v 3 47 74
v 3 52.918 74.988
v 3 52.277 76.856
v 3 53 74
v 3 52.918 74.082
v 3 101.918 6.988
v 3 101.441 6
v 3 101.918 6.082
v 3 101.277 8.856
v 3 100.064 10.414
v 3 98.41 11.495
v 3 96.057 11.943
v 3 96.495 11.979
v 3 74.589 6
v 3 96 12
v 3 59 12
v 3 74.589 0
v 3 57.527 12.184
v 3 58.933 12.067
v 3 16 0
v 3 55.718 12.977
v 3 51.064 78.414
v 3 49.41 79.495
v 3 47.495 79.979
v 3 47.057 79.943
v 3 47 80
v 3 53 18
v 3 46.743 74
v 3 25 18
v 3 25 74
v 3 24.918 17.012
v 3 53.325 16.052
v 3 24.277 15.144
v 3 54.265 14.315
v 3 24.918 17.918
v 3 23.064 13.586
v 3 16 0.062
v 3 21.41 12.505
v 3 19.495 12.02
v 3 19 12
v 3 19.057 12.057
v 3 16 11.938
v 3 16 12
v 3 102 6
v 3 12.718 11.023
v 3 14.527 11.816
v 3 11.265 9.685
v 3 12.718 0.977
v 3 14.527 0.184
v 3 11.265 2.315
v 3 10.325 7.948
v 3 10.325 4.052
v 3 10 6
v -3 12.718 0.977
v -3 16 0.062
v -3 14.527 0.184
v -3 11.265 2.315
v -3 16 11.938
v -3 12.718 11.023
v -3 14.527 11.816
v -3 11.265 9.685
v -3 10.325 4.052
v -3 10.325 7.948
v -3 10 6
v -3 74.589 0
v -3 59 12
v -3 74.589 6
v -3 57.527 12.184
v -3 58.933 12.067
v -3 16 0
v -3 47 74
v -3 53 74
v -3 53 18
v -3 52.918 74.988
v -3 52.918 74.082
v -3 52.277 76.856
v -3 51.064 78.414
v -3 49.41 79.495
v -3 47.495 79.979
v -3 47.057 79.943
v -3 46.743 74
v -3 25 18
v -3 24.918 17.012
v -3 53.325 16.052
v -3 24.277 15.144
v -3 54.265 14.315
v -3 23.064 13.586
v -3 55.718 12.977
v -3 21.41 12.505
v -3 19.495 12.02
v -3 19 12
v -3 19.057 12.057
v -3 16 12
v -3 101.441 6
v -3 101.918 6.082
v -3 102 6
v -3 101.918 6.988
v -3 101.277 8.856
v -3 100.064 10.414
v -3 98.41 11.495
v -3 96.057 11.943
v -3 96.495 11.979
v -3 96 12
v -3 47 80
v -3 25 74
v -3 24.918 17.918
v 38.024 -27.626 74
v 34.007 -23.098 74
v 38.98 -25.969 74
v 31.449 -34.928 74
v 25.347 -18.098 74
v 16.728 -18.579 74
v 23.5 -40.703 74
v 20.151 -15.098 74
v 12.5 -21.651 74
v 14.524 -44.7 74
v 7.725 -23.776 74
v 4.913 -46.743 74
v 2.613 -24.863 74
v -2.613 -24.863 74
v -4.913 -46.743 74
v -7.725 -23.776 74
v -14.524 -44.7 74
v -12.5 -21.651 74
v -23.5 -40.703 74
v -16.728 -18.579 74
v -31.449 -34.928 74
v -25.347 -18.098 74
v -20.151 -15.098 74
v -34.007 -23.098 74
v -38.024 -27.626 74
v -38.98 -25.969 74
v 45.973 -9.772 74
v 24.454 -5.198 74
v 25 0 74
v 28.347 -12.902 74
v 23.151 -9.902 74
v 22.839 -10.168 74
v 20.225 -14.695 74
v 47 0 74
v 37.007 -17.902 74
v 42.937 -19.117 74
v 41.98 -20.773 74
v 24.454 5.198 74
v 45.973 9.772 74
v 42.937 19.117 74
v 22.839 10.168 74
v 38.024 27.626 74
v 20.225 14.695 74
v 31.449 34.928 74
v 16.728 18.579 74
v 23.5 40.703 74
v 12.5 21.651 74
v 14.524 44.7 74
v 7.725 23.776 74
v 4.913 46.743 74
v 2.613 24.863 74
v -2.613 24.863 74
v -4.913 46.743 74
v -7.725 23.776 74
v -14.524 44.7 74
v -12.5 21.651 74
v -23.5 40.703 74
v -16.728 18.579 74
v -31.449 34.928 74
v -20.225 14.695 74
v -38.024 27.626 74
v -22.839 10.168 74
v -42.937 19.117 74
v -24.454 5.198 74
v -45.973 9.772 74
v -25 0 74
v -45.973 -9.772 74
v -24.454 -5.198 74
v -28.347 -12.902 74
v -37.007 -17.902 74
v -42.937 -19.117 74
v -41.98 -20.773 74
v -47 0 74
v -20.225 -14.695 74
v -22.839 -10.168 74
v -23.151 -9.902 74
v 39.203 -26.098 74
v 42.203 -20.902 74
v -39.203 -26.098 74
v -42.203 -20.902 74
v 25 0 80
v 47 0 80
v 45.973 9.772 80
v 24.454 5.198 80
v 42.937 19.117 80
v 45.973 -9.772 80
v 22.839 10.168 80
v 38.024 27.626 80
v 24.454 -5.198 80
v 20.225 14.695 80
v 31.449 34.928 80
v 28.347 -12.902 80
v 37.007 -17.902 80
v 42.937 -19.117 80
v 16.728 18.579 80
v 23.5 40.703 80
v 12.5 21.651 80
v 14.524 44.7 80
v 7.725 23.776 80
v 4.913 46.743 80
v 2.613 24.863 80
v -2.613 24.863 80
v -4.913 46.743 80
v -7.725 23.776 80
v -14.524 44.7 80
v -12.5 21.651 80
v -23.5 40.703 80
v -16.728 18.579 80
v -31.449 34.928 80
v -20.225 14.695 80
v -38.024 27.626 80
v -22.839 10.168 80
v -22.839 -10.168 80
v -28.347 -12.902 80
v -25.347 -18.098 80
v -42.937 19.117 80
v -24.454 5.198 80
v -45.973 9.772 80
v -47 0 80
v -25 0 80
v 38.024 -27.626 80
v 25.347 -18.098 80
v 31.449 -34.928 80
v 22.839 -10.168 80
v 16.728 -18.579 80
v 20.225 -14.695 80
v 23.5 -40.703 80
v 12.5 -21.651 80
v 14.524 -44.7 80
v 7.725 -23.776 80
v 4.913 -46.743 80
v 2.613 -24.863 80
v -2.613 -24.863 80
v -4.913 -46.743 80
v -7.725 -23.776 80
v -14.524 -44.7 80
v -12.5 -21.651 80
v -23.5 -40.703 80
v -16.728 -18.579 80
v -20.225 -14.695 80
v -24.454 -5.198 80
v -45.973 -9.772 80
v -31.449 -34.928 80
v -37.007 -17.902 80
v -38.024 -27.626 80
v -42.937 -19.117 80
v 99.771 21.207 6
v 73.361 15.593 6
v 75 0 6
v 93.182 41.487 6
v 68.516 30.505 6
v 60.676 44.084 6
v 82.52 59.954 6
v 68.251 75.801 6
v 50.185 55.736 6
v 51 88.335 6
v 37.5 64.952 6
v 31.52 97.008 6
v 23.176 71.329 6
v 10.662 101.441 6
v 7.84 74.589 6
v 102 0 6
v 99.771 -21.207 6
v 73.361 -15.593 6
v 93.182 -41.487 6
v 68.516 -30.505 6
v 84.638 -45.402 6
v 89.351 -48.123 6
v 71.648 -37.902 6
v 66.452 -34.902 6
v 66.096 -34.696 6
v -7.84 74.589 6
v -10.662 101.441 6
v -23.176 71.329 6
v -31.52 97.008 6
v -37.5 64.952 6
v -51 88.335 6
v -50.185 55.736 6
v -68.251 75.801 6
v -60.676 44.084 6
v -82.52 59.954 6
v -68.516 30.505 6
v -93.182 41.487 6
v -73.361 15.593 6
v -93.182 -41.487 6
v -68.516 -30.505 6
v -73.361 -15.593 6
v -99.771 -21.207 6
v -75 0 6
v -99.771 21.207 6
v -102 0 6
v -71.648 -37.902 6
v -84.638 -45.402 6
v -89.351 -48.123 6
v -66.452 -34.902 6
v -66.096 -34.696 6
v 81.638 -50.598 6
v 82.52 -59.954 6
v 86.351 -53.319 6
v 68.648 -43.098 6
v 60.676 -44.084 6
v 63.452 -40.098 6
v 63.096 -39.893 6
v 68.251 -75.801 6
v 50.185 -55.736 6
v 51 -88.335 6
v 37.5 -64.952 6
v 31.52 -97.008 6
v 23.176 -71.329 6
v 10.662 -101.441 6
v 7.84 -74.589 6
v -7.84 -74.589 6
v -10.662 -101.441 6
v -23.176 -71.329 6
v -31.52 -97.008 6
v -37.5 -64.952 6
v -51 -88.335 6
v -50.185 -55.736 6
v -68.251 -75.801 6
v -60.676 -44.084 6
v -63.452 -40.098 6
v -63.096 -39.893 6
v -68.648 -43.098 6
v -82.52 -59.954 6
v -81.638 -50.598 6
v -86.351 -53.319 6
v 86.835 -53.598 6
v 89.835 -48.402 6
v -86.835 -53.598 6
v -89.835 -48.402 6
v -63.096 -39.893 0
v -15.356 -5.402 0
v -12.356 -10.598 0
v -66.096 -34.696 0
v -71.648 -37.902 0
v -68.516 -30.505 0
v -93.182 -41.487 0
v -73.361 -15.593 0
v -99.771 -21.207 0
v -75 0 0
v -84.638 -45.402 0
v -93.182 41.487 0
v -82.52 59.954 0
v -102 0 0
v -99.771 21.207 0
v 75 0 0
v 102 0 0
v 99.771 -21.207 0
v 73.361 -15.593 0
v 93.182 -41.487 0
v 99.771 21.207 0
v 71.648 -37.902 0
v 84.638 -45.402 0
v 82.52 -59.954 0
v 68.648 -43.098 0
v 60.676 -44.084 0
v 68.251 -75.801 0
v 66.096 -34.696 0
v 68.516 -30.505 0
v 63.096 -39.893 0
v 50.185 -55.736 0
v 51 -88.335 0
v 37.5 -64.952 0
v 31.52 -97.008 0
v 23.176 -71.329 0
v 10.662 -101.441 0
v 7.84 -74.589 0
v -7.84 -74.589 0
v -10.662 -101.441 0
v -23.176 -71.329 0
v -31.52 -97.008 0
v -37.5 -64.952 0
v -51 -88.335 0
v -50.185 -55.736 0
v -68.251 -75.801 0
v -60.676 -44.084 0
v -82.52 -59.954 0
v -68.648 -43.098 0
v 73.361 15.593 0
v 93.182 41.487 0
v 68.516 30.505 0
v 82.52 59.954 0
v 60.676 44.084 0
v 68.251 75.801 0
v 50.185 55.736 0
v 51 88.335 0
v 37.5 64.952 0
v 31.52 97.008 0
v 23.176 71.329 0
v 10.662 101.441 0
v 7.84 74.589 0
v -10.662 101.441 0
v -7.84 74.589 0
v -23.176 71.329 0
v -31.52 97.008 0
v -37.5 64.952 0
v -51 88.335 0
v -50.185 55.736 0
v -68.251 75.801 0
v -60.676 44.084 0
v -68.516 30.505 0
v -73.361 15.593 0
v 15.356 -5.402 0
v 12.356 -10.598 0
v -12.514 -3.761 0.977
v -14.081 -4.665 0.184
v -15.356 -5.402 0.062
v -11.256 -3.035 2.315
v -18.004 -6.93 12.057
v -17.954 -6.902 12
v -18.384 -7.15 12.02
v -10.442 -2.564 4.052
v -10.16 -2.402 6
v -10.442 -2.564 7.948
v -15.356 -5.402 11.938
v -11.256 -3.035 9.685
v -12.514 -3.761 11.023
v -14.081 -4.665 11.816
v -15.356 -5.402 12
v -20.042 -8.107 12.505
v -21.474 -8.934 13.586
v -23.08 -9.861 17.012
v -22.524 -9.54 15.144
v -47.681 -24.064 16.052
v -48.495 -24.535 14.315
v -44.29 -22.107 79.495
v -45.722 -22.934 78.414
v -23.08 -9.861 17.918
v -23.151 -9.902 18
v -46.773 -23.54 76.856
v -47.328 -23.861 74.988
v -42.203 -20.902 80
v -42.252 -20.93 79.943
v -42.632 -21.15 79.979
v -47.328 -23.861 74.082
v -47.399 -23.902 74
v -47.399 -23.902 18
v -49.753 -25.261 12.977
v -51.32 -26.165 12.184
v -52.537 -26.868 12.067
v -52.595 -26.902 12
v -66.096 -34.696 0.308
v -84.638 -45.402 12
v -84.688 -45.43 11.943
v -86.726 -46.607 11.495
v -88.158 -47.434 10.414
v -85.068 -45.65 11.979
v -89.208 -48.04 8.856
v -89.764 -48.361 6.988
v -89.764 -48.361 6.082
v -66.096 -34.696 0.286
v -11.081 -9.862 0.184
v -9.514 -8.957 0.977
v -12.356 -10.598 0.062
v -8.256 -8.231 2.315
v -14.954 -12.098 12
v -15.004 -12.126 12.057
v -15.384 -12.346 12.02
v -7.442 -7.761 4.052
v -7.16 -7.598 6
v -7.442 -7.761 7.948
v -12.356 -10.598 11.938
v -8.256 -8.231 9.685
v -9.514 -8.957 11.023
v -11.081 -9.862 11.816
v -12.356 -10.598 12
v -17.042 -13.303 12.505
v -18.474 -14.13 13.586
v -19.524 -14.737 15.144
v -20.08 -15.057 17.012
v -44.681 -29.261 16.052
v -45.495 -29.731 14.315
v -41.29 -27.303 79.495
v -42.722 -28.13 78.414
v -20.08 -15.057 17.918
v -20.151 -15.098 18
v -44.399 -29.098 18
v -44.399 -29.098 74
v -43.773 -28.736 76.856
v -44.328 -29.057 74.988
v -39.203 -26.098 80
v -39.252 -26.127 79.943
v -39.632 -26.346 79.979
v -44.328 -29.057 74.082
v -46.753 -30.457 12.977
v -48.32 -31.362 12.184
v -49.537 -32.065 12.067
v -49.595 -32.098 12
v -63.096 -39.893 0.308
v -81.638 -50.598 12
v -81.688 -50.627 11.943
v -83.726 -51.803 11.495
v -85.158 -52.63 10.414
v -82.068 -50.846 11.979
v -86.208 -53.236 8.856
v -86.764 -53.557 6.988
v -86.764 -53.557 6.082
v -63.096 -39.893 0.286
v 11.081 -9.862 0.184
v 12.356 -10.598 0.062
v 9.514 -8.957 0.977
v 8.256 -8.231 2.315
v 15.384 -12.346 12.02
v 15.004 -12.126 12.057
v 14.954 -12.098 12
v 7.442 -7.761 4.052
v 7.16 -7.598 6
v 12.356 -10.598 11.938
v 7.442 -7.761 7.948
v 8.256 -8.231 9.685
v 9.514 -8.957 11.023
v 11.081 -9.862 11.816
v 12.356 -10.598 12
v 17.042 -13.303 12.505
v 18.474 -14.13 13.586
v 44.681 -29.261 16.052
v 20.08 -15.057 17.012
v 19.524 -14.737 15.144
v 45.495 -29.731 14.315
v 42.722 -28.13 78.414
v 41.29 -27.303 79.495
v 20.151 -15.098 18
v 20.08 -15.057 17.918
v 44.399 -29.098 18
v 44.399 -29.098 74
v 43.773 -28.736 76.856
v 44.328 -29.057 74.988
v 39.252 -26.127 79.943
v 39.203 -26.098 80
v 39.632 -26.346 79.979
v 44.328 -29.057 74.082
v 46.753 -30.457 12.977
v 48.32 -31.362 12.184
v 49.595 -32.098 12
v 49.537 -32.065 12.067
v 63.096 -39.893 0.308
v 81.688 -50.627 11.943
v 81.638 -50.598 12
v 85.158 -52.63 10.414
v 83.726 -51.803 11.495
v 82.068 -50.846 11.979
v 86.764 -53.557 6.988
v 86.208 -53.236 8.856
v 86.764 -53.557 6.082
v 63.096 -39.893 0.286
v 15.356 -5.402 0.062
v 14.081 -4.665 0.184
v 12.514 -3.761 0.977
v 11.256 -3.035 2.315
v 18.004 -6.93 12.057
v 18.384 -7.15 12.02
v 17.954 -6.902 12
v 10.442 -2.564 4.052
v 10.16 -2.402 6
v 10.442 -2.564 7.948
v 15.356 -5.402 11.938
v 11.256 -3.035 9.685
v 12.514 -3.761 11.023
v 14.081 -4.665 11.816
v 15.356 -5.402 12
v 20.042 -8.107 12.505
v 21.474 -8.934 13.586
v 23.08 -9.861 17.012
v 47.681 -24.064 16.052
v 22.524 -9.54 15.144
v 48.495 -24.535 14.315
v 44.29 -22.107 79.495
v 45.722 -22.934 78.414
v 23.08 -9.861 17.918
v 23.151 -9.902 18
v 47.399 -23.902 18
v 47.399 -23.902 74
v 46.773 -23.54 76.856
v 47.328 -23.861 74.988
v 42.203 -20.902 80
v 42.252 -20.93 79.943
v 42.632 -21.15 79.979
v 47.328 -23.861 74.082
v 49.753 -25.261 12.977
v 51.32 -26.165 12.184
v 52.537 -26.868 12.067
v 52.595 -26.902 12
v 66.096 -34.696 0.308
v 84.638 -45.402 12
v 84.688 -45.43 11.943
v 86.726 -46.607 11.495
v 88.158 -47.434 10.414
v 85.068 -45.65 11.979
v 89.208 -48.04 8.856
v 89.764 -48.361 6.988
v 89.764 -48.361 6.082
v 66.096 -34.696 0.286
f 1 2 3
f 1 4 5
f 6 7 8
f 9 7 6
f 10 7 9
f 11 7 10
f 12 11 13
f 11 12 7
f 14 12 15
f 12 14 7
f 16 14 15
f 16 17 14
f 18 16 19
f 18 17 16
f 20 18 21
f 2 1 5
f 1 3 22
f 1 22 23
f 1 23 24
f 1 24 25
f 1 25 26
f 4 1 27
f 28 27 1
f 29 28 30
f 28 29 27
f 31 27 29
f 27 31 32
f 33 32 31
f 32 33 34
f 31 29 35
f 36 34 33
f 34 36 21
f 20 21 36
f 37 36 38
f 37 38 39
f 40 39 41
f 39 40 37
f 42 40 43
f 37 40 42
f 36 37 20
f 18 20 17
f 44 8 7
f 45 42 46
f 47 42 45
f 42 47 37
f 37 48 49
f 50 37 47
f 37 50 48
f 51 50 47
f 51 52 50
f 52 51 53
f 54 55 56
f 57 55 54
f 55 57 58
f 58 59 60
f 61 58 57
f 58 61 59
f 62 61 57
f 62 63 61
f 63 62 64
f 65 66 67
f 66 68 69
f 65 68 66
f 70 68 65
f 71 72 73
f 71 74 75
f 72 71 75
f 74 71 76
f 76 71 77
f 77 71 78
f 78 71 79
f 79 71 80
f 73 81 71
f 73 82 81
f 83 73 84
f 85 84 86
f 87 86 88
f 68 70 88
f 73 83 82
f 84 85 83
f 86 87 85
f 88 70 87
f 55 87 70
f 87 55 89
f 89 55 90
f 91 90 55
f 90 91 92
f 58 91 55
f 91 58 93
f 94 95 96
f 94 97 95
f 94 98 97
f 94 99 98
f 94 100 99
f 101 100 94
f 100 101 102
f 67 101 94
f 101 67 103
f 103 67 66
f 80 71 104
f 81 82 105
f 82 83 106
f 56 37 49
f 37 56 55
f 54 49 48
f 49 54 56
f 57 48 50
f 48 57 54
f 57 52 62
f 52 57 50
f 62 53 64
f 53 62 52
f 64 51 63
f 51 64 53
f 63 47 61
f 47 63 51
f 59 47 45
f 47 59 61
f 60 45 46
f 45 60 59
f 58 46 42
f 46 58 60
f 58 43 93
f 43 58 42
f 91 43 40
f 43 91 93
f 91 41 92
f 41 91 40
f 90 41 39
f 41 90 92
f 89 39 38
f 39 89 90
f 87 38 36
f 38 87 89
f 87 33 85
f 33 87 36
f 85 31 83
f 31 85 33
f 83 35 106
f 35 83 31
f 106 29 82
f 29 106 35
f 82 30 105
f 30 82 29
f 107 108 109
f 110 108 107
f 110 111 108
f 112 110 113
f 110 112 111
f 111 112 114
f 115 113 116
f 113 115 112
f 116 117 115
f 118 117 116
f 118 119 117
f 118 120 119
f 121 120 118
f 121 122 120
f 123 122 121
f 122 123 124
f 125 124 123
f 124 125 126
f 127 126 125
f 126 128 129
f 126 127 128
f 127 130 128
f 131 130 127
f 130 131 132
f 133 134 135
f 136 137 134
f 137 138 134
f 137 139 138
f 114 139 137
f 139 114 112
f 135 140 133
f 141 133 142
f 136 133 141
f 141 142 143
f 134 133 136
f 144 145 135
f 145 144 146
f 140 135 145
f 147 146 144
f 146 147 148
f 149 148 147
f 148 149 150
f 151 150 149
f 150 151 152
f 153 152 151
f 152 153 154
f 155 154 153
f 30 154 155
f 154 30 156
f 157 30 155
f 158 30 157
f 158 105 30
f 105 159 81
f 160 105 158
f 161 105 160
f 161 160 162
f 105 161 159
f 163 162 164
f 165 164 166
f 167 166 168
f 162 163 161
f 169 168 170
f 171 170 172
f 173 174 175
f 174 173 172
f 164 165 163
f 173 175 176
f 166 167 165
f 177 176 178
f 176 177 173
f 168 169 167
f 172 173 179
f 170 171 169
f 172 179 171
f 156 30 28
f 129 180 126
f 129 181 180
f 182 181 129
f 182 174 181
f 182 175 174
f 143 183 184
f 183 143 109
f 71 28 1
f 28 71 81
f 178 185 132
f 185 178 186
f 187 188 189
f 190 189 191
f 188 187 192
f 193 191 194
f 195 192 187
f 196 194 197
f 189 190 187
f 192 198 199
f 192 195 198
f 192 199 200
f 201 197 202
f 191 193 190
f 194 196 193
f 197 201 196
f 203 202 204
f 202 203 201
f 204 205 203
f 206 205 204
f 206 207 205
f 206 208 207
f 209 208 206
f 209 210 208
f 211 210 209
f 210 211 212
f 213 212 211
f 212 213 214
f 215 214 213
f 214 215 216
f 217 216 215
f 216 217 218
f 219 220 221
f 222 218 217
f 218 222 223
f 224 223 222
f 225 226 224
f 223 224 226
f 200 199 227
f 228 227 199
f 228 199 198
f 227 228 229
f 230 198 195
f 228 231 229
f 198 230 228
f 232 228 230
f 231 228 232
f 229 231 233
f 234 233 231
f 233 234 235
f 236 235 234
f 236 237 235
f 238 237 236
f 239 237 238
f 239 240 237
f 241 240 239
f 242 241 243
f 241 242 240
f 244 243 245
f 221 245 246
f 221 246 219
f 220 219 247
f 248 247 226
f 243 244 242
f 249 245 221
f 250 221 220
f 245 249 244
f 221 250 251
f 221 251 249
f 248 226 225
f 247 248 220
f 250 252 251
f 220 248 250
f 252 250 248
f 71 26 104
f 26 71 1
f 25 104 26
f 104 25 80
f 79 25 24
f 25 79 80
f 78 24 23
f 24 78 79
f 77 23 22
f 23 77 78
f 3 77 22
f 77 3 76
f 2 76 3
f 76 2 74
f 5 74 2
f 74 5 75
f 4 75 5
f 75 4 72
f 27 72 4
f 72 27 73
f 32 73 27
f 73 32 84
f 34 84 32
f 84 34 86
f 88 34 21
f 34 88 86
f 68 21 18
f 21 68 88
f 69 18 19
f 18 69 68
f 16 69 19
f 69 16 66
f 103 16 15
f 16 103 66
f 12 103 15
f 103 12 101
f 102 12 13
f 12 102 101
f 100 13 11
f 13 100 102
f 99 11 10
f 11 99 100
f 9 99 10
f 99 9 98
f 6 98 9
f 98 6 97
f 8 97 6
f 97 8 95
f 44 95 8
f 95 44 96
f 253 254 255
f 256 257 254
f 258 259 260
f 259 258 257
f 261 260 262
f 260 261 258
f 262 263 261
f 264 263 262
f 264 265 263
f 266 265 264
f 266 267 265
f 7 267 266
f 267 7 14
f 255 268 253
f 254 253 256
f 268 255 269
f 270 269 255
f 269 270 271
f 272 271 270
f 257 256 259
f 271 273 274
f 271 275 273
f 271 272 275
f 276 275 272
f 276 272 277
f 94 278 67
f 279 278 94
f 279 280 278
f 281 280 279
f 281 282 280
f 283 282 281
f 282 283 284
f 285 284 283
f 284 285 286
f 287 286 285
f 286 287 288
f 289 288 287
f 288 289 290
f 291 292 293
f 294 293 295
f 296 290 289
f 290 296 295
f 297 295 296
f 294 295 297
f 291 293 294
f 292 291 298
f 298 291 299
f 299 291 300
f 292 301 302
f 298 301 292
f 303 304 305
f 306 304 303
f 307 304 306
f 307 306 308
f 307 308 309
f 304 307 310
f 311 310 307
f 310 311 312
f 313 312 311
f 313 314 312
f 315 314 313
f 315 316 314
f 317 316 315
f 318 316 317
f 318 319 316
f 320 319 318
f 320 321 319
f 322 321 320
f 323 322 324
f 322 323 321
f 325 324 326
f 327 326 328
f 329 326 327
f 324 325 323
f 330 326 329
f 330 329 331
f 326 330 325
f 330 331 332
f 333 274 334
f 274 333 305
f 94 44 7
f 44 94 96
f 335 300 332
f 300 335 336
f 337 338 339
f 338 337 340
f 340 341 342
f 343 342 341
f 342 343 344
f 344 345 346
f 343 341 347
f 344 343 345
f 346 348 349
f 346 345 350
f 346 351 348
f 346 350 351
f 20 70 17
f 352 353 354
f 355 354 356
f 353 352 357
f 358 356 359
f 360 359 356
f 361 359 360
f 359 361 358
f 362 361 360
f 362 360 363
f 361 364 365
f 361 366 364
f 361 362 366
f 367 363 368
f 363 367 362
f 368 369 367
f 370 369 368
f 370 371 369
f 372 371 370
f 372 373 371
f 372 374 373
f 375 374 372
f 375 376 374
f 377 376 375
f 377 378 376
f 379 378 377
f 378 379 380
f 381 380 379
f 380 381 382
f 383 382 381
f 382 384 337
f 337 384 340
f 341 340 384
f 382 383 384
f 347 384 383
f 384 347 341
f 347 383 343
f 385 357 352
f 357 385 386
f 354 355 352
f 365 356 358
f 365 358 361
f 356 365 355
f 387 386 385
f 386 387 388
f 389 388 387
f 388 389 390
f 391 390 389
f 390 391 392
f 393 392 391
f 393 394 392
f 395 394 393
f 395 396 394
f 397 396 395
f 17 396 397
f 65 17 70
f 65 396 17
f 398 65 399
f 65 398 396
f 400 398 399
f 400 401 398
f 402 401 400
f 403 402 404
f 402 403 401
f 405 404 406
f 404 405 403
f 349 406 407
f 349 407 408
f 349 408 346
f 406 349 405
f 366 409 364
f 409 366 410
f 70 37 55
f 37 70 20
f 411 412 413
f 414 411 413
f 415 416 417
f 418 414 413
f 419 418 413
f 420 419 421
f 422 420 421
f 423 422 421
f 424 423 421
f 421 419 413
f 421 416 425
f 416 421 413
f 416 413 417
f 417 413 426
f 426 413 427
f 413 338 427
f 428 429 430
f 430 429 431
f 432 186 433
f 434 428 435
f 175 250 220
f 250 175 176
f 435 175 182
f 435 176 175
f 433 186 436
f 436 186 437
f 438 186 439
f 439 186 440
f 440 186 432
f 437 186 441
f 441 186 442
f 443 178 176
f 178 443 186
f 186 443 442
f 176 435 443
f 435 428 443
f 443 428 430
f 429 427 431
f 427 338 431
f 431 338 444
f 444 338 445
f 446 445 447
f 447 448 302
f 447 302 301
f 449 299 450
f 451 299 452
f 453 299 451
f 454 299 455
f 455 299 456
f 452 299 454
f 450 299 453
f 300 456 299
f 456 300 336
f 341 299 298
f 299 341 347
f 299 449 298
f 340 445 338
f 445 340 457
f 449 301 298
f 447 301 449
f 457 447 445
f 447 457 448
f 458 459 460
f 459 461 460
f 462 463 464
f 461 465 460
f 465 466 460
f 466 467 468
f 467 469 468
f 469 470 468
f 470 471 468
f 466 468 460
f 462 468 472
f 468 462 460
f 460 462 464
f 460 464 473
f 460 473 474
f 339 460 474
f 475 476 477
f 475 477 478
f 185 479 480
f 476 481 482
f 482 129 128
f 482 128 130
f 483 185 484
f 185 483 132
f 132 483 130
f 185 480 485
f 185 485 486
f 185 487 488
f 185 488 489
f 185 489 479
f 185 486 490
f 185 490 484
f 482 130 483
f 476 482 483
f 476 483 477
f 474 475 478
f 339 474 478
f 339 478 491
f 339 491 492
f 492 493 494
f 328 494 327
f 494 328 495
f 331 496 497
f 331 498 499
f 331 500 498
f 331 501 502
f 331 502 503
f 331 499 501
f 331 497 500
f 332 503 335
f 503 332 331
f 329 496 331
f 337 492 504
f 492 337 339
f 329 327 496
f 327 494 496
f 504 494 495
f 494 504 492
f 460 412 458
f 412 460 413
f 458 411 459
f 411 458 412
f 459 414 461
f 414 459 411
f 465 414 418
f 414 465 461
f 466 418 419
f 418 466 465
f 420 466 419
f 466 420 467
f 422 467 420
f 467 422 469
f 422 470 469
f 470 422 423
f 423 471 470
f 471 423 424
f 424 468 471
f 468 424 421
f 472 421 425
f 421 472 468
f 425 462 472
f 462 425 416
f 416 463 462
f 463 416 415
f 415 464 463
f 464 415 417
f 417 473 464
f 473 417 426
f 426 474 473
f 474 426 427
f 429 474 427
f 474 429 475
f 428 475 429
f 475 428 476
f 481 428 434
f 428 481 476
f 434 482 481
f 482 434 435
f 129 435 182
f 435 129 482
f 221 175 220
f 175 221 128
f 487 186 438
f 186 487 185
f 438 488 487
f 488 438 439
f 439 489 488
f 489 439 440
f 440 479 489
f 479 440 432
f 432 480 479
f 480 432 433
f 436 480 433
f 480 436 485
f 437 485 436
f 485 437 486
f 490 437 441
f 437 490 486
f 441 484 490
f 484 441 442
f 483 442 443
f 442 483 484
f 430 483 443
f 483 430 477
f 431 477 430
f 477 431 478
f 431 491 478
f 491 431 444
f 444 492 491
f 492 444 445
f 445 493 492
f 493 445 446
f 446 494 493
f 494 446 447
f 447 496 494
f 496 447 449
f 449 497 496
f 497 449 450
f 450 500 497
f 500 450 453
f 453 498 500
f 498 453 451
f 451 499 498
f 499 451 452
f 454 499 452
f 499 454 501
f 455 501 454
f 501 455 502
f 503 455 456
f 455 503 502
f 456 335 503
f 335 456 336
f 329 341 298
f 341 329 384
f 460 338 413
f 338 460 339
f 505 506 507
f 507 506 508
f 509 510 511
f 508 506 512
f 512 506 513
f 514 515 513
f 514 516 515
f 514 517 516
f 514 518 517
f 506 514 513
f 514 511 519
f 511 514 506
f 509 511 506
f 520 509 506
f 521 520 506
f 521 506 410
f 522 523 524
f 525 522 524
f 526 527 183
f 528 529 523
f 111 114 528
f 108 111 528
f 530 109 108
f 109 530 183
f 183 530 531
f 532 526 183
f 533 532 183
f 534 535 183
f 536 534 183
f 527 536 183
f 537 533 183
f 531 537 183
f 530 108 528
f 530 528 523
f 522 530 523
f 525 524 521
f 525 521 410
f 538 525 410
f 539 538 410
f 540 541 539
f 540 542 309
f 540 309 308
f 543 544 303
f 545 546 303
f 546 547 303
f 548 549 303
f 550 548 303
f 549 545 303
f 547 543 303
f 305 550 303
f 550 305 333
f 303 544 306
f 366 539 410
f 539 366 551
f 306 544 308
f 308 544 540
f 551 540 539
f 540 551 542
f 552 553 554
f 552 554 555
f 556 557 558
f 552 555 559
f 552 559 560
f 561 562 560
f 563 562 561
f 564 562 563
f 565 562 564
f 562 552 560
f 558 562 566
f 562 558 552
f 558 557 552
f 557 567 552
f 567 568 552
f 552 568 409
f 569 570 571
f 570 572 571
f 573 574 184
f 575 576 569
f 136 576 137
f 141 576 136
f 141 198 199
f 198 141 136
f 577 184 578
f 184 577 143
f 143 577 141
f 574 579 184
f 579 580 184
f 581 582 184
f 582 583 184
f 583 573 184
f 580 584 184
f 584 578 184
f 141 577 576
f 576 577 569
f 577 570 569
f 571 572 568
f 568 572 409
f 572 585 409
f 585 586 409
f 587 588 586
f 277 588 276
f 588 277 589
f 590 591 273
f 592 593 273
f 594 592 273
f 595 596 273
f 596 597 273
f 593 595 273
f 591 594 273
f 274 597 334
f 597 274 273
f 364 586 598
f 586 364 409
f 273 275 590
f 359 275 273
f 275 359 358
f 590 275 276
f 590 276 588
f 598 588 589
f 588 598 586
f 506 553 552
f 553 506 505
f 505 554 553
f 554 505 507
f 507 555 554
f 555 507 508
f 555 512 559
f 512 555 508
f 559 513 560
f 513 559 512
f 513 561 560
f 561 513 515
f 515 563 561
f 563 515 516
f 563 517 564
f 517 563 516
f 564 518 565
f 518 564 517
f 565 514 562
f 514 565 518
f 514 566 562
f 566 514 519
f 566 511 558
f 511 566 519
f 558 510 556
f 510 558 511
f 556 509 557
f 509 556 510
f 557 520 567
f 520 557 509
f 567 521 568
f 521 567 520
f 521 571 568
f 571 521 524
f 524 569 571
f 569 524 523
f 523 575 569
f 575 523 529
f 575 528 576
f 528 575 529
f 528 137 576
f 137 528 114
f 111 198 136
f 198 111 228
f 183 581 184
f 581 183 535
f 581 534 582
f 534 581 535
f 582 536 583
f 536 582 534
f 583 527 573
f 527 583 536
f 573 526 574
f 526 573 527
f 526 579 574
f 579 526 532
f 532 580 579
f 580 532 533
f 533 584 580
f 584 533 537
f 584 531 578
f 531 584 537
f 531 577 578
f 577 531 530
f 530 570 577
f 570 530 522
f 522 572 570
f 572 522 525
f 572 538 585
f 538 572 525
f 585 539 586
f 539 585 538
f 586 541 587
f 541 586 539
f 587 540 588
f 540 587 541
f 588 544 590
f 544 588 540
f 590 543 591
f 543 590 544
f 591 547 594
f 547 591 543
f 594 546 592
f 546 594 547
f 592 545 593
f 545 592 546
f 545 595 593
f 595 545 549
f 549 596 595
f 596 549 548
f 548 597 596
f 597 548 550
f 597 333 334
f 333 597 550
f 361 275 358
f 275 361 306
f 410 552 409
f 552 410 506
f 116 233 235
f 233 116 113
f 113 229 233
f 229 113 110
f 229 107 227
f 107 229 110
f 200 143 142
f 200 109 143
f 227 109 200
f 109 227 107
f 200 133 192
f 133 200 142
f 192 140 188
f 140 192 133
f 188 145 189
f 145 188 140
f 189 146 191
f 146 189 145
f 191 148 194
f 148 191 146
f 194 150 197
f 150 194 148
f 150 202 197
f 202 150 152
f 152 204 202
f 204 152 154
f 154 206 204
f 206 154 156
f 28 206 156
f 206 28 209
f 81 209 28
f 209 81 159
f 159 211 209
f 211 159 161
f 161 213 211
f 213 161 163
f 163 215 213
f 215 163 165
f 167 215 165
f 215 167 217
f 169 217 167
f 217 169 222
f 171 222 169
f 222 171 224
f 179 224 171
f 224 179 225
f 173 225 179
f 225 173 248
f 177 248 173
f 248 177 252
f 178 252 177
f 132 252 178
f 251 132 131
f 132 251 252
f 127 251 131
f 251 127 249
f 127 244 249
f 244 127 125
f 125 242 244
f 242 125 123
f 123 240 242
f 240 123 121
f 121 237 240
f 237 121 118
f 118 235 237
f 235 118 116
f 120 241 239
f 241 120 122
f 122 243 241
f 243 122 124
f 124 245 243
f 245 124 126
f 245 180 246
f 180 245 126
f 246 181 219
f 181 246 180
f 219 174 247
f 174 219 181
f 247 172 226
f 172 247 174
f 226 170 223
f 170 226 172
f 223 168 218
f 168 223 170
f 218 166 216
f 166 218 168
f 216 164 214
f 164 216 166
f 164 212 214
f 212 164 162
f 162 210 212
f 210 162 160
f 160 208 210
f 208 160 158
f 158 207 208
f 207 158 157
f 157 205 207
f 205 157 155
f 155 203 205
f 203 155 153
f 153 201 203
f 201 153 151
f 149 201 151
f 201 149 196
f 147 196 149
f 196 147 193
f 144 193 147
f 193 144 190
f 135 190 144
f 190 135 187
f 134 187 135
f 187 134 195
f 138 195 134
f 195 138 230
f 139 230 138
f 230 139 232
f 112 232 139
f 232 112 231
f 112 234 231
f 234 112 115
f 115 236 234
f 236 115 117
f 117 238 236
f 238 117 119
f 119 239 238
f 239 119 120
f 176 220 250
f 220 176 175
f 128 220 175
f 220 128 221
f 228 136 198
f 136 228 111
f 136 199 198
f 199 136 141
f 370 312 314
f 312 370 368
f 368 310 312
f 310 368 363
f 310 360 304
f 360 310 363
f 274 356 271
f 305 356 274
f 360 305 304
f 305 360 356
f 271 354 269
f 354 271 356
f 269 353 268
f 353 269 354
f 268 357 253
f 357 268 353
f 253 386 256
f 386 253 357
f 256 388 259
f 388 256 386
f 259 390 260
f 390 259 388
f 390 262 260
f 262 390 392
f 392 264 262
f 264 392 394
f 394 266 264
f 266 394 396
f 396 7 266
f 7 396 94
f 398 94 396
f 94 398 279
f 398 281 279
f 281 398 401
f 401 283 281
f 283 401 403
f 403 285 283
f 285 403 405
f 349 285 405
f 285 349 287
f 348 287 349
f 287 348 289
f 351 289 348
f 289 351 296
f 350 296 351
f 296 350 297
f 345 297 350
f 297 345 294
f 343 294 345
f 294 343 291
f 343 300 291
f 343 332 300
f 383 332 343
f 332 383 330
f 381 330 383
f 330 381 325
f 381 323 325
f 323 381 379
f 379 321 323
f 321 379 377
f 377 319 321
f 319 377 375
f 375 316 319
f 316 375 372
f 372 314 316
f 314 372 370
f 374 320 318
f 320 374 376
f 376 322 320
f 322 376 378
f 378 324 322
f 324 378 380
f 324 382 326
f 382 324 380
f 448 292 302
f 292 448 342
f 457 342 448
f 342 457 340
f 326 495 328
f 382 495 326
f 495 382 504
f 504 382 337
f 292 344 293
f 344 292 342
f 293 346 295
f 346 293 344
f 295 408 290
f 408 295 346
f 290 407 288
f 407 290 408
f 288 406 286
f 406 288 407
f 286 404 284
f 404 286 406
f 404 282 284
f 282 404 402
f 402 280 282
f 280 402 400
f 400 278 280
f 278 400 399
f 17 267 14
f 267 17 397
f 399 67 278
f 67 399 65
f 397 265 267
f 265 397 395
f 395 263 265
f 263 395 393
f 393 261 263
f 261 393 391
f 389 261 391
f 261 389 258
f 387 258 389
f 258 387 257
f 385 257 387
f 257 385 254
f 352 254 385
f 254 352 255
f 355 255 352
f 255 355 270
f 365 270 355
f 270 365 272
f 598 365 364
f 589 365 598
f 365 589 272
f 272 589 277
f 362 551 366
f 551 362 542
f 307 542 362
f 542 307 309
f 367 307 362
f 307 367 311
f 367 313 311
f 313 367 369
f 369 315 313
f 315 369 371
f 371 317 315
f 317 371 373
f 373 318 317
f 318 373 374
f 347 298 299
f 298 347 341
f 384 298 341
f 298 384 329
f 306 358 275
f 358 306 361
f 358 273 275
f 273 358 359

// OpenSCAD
// Volume: 167575.89261655897, SurfaceArea: 69343.78331489394

// To render the DXF file from the command line:
// openscad -o example017.dxf -D'mode="parts"' example017.scad

//Mode can be either "parts",  "exploded" or "assembled".
mode = "assembled"; // ["parts",  "exploded", "assembled"]

thickness = 6;
locklen1 = 15;
locklen2 = 10;
boltlen = 15;
midhole = 10;
inner1_to_inner2 = 50;
total_height = 80;

module shape_tripod()
{
  x1 = 0;
  x2 = x1 + thickness;
  x3 = x2 + locklen1;
  x4 = x3 + thickness;
  x5 = x4 + inner1_to_inner2;
  x6 = x5 - thickness;
  x7 = x6 - locklen2;
  x8 = x7 - thickness;
  x9 = x8 - thickness;
  x10 = x9 - thickness;
  
  y1 = 0;
  y2 = y1 + thickness;
  y3 = y2 + thickness;
  y4 = y3 + thickness;
  y5 = y3 + total_height - 3*thickness;
  y6 = y5 + thickness;
  
  union() {
    difference() {
      polygon([
        [ x1, y2 ], [ x2, y2 ],
        [ x2, y1 ], [ x3, y1 ], [ x3, y2 ],
        [ x4, y2 ], [ x4, y1 ], [ x5, y1 ],
        [ x5 + thickness, y3 ], [ x5, y4 ],
        [ x5, y5 ],
        [ x6, y5 ], [ x6, y6 ], [ x7, y6 ], [ x7, y5 ], [ x8, y5 ],
        [ x8, y6 ], [ x9, y5 ],
        [ x9, y4 ], [ x10, y3 ],
        [ x2, y3 ]
      ]);
      translate([ x10, y4 ]) circle(thickness);
      translate([ x5 + thickness, y4 ]) circle(thickness);
    }
  
    translate([ x5, y1 ]) square([ boltlen - thickness, thickness*2 ]);
  
    translate([ x5 + boltlen - thickness, y2 ]) circle(thickness);
  
    translate([ x2, y2 ]) intersection() {
      circle(thickness);
      translate([ -thickness*2, 0 ]) square(thickness*2);
    }
  
    translate([ x8, y5 ]) intersection() {
      circle(thickness);
      translate([ -thickness*2, 0 ]) square(thickness*2);
    }
  }
}

module shape_inner_disc()
{
  difference() {
    circle(midhole + boltlen + 2*thickness + locklen2);
    for (alpha = [ 0, 120, 240 ]) {
      rotate(alpha) translate([ 0, midhole + boltlen + thickness + locklen2/2 ]) square([ thickness, locklen2 ], true);
    }
    circle(midhole + boltlen);
  }
}

module shape_outer_disc()
{
  difference() {
    circle(midhole + boltlen + inner1_to_inner2 + 2*thickness + locklen1);
    for (alpha = [ 0, 120, 240 ]) {
      rotate(alpha) translate([ 0, midhole + boltlen + inner1_to_inner2 + thickness + locklen1/2 ]) square([ thickness, locklen1 ], true);
    }
    circle(midhole + boltlen + inner1_to_inner2);
  }
}

module parts()
{
  tripod_x_off = locklen1 - locklen2 + inner1_to_inner2;
  tripod_y_off = max(midhole + boltlen + inner1_to_inner2 + 4*thickness + locklen1, total_height);

  shape_inner_disc();
  shape_outer_disc();

  for (s = [ [1,1], [-1,1], [1,-1] ]) {
    scale(s) translate([ tripod_x_off, -tripod_y_off ]) shape_tripod();
  }
}

module exploded()
{
  translate([ 0, 0, total_height + 2*thickness ]) linear_extrude(height = thickness, convexity = 4) shape_inner_disc();
  linear_extrude(height = thickness, convexity = 4) shape_outer_disc();

  color([ 0.7, 0.7, 1 ]) for (alpha = [ 0, 120, 240 ]) {
    rotate(alpha)
      translate([ 0, thickness*2 + locklen1 + inner1_to_inner2 + boltlen + midhole, 1.5*thickness ])
        rotate([ 90, 0, -90 ])
          linear_extrude(height = thickness, convexity = 10, center = true) shape_tripod();
  }
}

module bottle()
{
  r = boltlen + midhole;
  h = total_height - thickness*2;

  rotate_extrude(convexity = 2) {
    square([ r, h ]);

    translate([ 0, h ]) {
      intersection() {
        square([ r, r ]);
        scale([ 1, 0.7 ]) circle(r);
      }
    }
    translate([ 0, h+r ]) {
      intersection() {
        translate([ 0, -r/2 ]) square([ r/2, r ]);
        circle(r/2);
      }
    }
  }
}

module assembled()
{
  translate([ 0, 0, total_height - thickness ]) linear_extrude(height = thickness, convexity = 4) shape_inner_disc();
  linear_extrude(height = thickness, convexity = 4) shape_outer_disc();

  color([ 0.7, 0.7, 1 ]) for (alpha = [ 0, 120, 240 ]) {
    rotate(alpha)
      translate([ 0, thickness*2 + locklen1 + inner1_to_inner2 + boltlen + midhole, 0 ])
        rotate([ 90, 0, -90 ])
          linear_extrude(height = thickness, convexity = 10, center = true) shape_tripod();
  }

  % translate([ 0, 0, thickness*2]) bottle();
}

echo(version=version());

if (mode == "parts") parts();

if (mode == "exploded") exploded();

if (mode == "assembled") assembled();

// Written by Clifford Wolf <clifford@clifford.at> and Marius
// Kintel <marius@kintel.net>
//
// To the extent possible under law, the author(s) have dedicated all
// copyright and related and neighboring rights to this software to the
// public domain worldwide. This software is distributed without any
// warranty.
//
// You should have received a copy of the CC0 Public Domain
// Dedication along with this software.
// If not, see <http://creativecommons.org/publicdomain/zero/1.0/>.
